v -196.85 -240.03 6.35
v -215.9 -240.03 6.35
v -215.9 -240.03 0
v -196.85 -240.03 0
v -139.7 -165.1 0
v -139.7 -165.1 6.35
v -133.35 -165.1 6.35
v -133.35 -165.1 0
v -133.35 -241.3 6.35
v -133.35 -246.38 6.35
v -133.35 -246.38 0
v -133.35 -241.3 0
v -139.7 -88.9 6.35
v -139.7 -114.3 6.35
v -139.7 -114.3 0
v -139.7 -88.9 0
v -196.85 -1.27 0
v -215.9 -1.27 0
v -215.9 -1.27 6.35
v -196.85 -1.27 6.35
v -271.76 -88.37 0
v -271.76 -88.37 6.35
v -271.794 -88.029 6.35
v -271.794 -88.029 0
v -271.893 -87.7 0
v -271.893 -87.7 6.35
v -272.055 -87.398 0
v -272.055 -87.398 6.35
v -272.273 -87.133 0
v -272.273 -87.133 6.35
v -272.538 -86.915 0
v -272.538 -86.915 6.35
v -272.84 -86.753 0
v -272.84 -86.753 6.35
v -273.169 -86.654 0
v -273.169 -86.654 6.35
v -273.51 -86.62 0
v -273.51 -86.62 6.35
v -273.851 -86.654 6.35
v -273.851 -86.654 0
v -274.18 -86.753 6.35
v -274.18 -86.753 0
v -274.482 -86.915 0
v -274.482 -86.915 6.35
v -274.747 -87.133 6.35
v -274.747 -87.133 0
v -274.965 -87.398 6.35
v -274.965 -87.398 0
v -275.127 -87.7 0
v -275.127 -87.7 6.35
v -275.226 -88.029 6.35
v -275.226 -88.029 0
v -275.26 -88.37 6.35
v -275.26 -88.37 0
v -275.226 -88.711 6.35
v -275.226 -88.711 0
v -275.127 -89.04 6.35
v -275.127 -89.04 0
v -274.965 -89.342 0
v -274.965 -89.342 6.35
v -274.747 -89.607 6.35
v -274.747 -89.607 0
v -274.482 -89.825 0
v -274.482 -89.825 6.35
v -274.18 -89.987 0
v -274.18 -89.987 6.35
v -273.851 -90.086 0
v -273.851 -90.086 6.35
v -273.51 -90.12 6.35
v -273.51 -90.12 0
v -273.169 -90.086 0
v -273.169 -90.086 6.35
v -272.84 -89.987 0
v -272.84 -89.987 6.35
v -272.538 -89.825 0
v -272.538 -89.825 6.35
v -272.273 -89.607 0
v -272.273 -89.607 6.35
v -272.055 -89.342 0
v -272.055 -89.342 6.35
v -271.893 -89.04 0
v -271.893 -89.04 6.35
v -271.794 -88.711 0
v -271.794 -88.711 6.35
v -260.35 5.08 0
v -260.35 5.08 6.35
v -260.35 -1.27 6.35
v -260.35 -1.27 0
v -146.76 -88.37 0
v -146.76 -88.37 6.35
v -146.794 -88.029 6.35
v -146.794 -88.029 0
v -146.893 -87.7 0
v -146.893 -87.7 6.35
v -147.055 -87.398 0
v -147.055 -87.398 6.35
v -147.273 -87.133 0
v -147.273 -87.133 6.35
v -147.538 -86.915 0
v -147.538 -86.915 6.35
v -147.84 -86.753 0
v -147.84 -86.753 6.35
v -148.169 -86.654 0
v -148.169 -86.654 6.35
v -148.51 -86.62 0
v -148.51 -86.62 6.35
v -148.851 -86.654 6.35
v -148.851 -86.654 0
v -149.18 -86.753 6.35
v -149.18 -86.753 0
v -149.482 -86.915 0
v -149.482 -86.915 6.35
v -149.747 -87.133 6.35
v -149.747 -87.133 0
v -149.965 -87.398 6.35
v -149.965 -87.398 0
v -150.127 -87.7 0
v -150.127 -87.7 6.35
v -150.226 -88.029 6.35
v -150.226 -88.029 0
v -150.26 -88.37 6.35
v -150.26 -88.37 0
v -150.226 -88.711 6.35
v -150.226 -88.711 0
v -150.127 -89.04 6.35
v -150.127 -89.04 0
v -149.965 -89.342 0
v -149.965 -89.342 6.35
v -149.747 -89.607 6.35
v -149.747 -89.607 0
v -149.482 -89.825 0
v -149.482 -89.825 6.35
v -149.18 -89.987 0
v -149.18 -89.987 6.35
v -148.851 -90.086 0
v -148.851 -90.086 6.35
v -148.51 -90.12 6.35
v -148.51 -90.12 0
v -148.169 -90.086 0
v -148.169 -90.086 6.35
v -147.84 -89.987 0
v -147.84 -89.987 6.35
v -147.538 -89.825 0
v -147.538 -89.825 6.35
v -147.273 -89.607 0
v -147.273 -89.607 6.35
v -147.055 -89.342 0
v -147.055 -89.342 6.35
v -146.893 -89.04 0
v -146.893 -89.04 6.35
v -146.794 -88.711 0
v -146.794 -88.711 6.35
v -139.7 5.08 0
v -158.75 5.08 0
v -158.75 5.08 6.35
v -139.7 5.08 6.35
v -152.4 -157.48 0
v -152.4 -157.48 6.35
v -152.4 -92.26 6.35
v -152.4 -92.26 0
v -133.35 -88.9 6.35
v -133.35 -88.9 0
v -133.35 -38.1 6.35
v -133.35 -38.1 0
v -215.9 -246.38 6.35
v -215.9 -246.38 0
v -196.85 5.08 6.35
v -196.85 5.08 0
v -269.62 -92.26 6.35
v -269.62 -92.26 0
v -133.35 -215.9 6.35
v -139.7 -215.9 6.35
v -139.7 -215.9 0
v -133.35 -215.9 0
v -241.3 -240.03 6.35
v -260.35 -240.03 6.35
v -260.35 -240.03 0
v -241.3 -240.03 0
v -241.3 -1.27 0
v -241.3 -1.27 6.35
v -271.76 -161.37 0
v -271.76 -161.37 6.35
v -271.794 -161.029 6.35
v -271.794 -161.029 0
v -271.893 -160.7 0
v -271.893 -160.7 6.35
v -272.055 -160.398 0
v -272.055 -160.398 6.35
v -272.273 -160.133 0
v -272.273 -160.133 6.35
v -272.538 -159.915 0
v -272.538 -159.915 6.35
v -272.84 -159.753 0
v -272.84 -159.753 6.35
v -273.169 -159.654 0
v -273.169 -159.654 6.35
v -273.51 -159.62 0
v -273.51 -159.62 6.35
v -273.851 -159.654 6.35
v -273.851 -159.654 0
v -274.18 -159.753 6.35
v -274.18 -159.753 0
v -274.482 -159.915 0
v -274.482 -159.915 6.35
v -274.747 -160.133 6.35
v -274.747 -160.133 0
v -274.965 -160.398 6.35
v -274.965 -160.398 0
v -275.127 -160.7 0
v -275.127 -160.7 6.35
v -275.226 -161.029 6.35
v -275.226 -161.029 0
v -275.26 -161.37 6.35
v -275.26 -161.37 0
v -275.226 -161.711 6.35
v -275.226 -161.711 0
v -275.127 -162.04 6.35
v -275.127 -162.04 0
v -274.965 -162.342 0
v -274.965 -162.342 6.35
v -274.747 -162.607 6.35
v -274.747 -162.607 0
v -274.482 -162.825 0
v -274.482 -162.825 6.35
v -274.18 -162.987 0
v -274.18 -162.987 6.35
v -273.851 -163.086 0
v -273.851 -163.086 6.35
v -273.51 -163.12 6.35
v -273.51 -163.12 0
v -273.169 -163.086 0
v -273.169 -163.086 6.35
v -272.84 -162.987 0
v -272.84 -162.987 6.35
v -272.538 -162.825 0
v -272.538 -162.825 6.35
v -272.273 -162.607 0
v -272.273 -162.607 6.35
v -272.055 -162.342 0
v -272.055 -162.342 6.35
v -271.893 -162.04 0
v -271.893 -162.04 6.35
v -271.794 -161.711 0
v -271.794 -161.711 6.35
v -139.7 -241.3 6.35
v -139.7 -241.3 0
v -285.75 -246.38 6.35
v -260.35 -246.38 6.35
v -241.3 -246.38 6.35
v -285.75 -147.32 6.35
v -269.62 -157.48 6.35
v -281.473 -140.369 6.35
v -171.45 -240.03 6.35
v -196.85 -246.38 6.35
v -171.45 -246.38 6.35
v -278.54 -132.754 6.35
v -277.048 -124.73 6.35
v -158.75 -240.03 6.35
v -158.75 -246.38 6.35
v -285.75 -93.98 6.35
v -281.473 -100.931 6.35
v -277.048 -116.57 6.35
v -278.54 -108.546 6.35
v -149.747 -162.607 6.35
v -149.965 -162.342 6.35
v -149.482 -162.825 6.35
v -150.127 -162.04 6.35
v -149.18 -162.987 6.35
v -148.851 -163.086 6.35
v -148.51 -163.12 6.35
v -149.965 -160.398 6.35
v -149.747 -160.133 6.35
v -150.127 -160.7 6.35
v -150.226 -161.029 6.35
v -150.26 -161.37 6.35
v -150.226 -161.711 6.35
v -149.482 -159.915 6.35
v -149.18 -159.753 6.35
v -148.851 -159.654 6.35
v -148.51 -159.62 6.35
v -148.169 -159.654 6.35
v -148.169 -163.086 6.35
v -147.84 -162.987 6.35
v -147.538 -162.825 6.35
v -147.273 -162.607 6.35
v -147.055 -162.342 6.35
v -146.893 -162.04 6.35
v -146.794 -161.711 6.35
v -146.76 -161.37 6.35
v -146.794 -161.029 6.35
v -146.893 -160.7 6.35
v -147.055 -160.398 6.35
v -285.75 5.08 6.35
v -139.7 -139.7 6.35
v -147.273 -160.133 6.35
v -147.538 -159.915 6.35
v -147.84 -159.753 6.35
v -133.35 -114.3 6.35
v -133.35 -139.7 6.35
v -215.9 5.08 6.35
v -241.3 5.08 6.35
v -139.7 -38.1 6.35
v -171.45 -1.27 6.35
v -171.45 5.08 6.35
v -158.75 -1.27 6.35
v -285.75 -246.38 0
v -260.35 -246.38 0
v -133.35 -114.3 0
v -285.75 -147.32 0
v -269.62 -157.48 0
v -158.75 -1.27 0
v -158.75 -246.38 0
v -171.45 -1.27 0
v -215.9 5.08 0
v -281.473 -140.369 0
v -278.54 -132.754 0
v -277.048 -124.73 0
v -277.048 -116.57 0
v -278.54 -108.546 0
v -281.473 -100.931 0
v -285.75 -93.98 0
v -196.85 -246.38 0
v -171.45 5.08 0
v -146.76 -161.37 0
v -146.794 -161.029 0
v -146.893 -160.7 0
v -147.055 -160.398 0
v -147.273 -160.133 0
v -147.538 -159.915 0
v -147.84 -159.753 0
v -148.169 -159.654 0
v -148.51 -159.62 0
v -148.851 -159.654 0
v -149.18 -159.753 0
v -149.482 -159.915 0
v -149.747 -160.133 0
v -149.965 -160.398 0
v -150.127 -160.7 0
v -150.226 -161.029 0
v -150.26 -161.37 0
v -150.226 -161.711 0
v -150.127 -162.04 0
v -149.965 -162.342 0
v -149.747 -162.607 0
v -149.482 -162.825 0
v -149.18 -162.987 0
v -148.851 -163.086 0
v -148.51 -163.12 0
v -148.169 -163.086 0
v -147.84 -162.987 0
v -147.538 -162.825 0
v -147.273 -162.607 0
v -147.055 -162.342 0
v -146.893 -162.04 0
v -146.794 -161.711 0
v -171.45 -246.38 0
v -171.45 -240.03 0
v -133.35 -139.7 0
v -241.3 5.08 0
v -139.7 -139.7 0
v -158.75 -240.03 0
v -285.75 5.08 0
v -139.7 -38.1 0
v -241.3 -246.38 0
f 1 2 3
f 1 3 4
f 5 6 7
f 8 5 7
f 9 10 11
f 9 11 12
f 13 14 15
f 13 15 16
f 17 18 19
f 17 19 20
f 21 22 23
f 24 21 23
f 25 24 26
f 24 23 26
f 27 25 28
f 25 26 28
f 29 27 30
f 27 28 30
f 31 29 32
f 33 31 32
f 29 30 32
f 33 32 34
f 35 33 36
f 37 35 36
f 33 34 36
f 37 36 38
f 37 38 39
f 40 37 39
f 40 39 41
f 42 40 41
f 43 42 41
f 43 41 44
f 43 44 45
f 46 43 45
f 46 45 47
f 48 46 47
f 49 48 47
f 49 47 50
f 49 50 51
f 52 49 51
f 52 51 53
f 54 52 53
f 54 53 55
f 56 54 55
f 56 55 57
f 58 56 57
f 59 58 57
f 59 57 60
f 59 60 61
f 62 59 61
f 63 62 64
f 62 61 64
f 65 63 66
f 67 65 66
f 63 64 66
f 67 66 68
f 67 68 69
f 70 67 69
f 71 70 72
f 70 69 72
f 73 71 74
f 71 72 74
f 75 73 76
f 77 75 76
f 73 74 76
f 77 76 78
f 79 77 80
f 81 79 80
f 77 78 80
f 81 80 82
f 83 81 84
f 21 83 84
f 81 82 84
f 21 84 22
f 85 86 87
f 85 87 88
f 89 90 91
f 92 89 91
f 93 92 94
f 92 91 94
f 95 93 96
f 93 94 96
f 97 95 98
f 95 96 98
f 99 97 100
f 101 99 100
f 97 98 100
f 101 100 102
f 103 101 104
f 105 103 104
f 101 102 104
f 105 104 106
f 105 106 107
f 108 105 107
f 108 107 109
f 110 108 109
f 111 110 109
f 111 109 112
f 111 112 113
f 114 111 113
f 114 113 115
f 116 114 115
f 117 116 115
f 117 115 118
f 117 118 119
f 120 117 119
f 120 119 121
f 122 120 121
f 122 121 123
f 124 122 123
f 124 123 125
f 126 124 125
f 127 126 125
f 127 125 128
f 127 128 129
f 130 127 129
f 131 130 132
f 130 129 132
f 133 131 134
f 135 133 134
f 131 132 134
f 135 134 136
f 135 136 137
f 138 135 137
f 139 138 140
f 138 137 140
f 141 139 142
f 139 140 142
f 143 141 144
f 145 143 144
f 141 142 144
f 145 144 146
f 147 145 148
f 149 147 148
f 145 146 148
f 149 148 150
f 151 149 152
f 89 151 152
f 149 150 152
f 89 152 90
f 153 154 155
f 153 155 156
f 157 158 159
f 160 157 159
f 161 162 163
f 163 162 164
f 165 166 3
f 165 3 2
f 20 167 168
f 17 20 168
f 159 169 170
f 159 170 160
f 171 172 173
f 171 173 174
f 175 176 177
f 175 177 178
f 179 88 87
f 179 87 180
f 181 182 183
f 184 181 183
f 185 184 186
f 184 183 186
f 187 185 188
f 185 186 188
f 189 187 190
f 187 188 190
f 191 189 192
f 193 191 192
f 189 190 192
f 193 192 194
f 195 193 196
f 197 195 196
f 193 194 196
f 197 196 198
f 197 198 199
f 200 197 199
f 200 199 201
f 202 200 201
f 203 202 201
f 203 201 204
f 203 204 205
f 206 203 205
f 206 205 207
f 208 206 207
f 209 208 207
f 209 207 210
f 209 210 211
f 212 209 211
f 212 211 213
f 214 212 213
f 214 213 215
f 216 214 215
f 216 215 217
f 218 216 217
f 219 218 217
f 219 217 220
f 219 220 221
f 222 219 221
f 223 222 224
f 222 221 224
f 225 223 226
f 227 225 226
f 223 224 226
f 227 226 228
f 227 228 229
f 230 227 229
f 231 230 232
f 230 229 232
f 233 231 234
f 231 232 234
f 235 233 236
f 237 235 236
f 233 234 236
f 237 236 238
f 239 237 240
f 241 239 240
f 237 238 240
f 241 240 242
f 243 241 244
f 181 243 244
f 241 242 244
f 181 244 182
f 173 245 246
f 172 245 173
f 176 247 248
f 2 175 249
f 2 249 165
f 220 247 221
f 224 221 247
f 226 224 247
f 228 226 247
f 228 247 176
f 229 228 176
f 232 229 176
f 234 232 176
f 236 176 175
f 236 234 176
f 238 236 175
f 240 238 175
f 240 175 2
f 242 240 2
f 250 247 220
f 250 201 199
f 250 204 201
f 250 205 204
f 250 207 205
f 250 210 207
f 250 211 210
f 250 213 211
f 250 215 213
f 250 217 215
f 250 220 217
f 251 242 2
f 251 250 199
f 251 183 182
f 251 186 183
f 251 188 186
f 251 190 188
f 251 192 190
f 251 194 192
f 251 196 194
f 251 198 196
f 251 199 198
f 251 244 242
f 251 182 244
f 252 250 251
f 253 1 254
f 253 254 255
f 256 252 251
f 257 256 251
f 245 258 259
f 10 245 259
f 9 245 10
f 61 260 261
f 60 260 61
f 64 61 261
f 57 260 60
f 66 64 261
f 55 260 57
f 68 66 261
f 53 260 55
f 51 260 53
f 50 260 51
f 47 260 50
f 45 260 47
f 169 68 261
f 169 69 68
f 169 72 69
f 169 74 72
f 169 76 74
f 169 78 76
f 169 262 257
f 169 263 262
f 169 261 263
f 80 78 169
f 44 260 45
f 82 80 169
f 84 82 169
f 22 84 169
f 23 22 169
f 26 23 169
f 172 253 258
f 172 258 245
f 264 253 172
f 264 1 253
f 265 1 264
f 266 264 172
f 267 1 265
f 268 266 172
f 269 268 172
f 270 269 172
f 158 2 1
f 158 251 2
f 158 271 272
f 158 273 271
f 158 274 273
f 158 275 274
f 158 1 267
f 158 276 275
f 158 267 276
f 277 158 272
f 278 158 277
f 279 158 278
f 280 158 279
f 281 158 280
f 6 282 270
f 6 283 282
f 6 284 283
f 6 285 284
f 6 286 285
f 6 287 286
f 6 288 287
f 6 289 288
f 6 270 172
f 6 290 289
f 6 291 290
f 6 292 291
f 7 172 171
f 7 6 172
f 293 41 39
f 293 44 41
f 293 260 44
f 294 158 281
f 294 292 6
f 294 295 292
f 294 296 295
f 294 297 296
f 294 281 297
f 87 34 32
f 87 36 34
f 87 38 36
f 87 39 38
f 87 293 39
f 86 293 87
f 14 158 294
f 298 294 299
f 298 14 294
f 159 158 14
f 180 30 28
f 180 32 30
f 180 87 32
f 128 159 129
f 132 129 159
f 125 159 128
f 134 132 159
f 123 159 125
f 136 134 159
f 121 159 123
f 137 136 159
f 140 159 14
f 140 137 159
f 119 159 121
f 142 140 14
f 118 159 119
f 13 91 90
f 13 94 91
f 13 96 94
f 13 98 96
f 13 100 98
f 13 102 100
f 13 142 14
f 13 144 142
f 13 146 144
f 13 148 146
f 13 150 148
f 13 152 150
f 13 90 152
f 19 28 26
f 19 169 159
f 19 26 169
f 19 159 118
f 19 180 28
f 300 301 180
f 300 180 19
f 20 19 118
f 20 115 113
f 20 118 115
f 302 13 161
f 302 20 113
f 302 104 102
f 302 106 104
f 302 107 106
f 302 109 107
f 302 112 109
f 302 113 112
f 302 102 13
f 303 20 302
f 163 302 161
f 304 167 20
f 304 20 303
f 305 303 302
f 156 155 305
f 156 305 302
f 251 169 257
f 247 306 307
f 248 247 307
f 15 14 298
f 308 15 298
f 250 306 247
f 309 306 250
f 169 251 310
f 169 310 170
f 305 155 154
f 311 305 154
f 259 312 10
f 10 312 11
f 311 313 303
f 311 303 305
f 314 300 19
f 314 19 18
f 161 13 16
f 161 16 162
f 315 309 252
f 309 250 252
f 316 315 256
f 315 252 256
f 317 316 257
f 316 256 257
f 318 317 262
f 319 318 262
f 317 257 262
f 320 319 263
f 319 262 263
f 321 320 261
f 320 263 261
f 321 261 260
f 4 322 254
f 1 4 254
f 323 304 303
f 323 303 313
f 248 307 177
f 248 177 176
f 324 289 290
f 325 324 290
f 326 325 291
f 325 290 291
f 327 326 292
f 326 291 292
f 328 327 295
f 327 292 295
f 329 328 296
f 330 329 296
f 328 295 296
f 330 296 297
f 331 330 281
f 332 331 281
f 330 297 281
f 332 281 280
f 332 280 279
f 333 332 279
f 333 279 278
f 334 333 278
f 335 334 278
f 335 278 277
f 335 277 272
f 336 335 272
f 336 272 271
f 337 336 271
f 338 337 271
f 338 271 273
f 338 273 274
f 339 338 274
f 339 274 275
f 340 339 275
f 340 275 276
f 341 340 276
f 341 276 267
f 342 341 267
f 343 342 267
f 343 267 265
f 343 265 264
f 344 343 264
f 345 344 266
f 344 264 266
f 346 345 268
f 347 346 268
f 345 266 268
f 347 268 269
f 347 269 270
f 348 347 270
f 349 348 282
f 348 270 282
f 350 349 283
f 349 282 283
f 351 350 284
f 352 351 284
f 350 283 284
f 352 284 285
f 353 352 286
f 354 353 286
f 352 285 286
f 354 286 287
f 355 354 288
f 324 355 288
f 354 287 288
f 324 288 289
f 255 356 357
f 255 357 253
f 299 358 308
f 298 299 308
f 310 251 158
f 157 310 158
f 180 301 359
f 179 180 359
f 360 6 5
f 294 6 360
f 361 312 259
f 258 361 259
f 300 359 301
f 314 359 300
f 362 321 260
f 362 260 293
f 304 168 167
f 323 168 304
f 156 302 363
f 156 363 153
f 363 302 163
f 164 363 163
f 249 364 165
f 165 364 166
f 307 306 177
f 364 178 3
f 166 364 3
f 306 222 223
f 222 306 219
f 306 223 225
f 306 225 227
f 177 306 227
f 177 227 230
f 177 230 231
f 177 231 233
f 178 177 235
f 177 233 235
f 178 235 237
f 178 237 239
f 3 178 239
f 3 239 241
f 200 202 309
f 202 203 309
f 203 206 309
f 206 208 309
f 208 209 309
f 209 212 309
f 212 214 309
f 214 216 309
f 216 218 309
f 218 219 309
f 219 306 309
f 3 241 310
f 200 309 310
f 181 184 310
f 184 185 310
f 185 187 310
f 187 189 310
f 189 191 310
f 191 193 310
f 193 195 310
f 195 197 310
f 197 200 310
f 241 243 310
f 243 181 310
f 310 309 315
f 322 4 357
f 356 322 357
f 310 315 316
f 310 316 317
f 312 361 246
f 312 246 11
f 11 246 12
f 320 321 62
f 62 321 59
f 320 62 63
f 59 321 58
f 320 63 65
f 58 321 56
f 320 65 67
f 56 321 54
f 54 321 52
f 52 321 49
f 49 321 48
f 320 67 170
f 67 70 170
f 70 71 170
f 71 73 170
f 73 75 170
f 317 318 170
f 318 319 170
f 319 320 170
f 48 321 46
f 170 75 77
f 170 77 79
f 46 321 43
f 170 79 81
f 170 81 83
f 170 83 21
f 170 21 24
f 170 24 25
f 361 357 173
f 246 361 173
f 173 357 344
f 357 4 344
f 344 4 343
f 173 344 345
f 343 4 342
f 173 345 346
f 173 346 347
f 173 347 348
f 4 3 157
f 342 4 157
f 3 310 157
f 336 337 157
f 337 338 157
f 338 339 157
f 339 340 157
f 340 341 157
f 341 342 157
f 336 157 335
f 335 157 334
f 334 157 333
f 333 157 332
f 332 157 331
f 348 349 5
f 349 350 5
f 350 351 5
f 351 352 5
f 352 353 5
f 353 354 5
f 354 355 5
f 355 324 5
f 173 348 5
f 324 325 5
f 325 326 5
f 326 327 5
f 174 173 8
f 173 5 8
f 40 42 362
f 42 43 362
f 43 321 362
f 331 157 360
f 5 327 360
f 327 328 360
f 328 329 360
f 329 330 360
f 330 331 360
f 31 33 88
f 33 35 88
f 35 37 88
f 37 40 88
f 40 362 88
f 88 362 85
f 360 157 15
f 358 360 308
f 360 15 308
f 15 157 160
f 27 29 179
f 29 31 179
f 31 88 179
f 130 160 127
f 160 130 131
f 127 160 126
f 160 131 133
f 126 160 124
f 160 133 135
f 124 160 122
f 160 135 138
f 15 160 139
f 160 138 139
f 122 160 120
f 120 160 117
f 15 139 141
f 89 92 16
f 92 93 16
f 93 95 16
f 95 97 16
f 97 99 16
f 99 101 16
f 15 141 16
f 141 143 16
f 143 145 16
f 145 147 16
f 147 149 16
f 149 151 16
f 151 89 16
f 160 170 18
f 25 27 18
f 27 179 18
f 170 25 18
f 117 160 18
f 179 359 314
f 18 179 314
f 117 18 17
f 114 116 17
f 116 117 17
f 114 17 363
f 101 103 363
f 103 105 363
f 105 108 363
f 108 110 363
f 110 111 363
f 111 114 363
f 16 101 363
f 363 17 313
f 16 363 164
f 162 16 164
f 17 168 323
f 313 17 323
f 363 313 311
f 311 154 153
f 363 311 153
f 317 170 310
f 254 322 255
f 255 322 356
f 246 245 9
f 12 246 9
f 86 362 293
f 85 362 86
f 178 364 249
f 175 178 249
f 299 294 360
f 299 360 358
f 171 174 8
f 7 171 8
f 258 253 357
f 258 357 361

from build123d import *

# Parameters (mm, degrees)
SKETCH1_W               = 152.4
SKETCH1_H               = 251.46
BOSS_EXTRUDE1_DEPTH     = 6.35
SKETCH2_W               = 19.05
SKETCH2_H               = 6.35
SKETCH2_W_2             = 12.7
CUT_EXTRUDE1_DEPTH      = 6.35
SKETCH3_W               = 19.05
SKETCH3_H               = 6.35
SKETCH3_W_2             = 12.7
CUT_EXTRUDE2_DEPTH      = 1
CUT_EXTRUDE2_DEPTH_BACK = 6.35
SKETCH4_W               = 6.35
SKETCH4_H               = 25.4
SKETCH4_H_2             = 43.18
CUT_EXTRUDE3_DEPTH      = 6.35
SKETCH5_R               = 44.45
CUT_EXTRUDE4_DEPTH      = 7.35
SKETCH6_W               = 117.22
SKETCH6_H               = 65.22
SKETCH6_R               = 1.75
CUT_EXTRUDE5_DEPTH      = 7.35


with BuildPart() as part:
    # Sketch1 → Boss-Extrude1 (new body)
    with BuildSketch(Plane.XY):
        with Locations((-209.55, -120.65)):
            Rectangle(SKETCH1_W, SKETCH1_H)
    extrude(amount=BOSS_EXTRUDE1_DEPTH)

    # Sketch2 → Cut-Extrude1 (cut)
    with BuildSketch(Plane(origin=(0, 5.08, 0), x_dir=(1, 0, 0), z_dir=(0, 1, 0))):
        with Locations((-250.825, -3.175)):
            Rectangle(SKETCH2_W, SKETCH2_H)
        with Locations((-206.375, -3.175)):
            Rectangle(SKETCH2_W, SKETCH2_H)
        with Locations((-165.1, -3.175)):
            Rectangle(SKETCH2_W_2, SKETCH2_H)
    extrude(amount=-CUT_EXTRUDE1_DEPTH, mode=Mode.SUBTRACT)

    # Sketch3 → Cut-Extrude2 (cut, two sides)
    with BuildSketch(Plane.XZ.offset(246.38)) as cut_extrude2_sk:
        with Locations((-250.825, 3.175)):
            Rectangle(SKETCH3_W, SKETCH3_H)
        with Locations((-206.375, 3.175)):
            Rectangle(SKETCH3_W, SKETCH3_H)
        with Locations((-165.1, 3.175)):
            Rectangle(SKETCH3_W_2, SKETCH3_H)
    extrude(amount=CUT_EXTRUDE2_DEPTH, mode=Mode.SUBTRACT)
    extrude(cut_extrude2_sk.sketch, amount=-CUT_EXTRUDE2_DEPTH_BACK, mode=Mode.SUBTRACT)

    # Sketch4 → Cut-Extrude3 (cut)
    with BuildSketch(Plane.XY.offset(6.35)):
        with Locations((-136.525, -152.4)):
            Rectangle(SKETCH4_W, SKETCH4_H)
        with Locations((-136.525, -101.6)):
            Rectangle(SKETCH4_W, SKETCH4_H)
        with Locations((-136.525, -16.51)):
            Rectangle(SKETCH4_W, SKETCH4_H_2)
        with Locations((-136.525, -228.6)):
            Rectangle(SKETCH4_W, SKETCH4_H)
    extrude(amount=-CUT_EXTRUDE3_DEPTH, mode=Mode.SUBTRACT)

    # Sketch5 → Cut-Extrude4 (cut, through all)
    with BuildSketch(Plane.XY.offset(6.35)):
        with Locations((-321.31, -120.65)):
            Circle(SKETCH5_R)
    extrude(amount=-CUT_EXTRUDE4_DEPTH, mode=Mode.SUBTRACT)

    # Sketch6 → Cut-Extrude5 (cut, through all)
    with BuildSketch(Plane.XY.offset(6.35)):
        with Locations((-211.01, -124.87)):
            Rectangle(SKETCH6_W, SKETCH6_H)
        with Locations((-273.51, -88.37)):
            Circle(SKETCH6_R)
        with Locations((-273.51, -161.37)):
            Circle(SKETCH6_R)
        with Locations((-148.51, -88.37)):
            Circle(SKETCH6_R)
        with Locations((-148.51, -161.37)):
            Circle(SKETCH6_R)
    extrude(amount=-CUT_EXTRUDE5_DEPTH, mode=Mode.SUBTRACT)


solid = part.part
